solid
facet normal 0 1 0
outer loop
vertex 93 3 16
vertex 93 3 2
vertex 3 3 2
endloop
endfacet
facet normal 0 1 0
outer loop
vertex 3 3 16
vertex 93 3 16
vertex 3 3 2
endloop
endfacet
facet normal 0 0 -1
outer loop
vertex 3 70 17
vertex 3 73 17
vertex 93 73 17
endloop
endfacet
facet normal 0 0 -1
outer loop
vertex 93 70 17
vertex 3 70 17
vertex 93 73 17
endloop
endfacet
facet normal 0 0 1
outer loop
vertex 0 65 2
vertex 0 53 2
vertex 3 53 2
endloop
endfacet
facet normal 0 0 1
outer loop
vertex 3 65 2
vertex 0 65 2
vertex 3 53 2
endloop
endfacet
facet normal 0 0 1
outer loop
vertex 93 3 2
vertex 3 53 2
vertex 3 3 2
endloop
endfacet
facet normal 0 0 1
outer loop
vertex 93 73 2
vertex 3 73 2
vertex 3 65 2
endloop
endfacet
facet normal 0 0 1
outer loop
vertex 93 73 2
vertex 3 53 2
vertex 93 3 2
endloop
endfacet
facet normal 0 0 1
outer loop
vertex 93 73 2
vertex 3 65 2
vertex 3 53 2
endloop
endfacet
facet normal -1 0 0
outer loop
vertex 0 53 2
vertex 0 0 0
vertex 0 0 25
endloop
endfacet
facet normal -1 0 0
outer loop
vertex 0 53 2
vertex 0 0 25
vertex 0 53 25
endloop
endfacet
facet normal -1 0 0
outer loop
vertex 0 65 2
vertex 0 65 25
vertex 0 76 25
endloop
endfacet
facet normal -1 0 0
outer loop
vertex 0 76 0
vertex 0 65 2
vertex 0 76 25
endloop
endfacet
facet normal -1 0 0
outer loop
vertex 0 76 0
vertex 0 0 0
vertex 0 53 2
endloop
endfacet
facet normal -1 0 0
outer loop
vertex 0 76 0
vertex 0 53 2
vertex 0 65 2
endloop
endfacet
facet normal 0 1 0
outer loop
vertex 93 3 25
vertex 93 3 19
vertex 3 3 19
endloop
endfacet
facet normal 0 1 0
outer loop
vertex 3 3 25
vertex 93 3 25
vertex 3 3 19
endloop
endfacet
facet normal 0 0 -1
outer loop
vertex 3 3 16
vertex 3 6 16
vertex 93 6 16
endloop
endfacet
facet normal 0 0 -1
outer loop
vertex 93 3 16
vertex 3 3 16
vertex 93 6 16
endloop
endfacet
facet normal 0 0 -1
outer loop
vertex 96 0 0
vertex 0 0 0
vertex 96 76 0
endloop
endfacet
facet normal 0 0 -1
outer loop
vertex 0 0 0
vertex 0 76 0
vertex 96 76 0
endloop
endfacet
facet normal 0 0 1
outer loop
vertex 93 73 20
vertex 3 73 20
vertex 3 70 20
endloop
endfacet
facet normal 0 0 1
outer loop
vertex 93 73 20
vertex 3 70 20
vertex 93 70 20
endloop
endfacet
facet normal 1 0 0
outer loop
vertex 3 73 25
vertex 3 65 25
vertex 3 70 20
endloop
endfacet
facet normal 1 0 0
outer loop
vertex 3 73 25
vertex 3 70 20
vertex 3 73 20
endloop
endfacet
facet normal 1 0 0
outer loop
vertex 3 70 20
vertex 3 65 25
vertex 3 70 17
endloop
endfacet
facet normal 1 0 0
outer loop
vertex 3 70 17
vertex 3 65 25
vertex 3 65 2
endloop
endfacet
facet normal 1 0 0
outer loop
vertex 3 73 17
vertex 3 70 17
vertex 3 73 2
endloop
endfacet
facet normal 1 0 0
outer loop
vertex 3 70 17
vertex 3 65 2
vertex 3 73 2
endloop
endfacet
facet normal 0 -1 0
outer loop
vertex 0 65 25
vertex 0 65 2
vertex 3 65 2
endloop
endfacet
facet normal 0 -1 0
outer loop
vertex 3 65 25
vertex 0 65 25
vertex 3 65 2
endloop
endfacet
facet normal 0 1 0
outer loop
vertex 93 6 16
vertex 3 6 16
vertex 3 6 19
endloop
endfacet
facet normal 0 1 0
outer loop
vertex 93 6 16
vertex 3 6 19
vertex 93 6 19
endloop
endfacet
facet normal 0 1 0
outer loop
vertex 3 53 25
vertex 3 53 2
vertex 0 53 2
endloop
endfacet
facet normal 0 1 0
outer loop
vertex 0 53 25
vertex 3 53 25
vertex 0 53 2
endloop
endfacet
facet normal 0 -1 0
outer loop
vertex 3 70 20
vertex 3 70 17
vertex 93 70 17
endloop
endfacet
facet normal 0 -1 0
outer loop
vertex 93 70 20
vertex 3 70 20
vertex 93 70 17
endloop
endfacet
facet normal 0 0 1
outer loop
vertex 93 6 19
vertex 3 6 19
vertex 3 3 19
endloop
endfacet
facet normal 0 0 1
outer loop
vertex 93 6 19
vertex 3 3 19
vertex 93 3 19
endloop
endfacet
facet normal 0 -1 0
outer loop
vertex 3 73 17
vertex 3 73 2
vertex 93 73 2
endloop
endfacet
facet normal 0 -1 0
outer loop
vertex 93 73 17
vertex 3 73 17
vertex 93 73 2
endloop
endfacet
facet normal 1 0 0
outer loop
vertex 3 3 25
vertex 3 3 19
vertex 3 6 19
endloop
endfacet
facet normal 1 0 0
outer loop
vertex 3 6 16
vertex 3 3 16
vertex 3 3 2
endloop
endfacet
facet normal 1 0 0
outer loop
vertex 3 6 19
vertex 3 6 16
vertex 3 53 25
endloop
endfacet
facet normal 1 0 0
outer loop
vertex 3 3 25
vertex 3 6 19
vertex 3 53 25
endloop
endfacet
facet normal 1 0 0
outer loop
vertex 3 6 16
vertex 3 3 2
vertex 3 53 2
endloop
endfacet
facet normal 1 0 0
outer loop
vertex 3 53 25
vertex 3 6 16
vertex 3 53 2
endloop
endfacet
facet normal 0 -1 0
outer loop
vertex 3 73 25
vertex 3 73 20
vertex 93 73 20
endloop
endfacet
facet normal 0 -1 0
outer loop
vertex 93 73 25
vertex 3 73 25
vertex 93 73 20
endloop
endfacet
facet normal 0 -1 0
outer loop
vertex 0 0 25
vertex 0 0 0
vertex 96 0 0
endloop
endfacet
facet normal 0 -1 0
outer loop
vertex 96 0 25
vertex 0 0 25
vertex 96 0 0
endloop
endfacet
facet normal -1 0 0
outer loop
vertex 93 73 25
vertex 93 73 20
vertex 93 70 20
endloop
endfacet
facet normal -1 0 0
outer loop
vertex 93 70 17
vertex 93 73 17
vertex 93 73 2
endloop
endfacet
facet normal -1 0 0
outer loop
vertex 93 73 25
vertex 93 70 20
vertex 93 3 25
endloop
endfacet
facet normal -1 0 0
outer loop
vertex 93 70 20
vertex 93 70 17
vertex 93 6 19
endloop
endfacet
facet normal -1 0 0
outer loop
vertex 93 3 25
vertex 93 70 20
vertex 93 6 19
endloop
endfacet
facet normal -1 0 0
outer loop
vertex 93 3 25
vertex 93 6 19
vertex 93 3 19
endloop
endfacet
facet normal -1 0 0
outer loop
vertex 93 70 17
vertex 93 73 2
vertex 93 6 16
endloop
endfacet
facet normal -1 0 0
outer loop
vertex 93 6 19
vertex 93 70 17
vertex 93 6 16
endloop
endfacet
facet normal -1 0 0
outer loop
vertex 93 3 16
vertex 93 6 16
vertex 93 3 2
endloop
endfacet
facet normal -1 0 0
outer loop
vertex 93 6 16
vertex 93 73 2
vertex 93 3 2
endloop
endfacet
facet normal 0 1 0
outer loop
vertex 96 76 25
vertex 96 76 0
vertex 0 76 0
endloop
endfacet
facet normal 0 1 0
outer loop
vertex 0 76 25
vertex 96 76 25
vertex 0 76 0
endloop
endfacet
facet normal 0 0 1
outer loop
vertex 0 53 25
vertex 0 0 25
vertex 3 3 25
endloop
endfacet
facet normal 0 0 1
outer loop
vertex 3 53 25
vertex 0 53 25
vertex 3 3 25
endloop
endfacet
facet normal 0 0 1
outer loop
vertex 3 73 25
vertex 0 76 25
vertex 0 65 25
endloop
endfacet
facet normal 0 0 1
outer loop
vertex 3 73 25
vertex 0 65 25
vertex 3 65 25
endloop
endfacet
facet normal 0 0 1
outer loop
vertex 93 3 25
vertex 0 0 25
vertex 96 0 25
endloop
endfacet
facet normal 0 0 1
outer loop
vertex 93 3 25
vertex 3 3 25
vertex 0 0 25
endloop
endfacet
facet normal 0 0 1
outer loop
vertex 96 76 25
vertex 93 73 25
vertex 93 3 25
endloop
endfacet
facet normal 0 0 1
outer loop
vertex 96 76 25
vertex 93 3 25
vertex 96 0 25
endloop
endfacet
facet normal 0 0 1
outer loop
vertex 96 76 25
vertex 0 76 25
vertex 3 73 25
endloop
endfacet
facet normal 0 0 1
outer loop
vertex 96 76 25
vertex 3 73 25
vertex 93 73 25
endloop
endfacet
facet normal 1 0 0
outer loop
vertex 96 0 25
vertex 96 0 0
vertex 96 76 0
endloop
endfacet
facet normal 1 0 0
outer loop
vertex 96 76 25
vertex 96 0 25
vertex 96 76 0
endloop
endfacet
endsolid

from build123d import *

# Parameters (mm, degrees)
PAD_DEPTH    = 25
SKETCH001_W  = 96
SKETCH001_H  = 76
PAD001_DEPTH = 2
SKETCH002_W  = 96
SKETCH002_H  = 3
PAD002_DEPTH = 3
SKETCH003_W  = 96
SKETCH003_H  = 3
PAD003_DEPTH = 3


with BuildPart() as part:
    # Sketch → Pad (new body)
    with BuildSketch(Plane.XY):
        Polygon((0, 0), (96, 0), (96, 76), (0, 76), (0, 65), (3, 65), (3, 73), (93, 73), (93, 3), (3, 3), (3, 53), (0, 53), align=None)
    extrude(amount=PAD_DEPTH)

    # Sketch001 → Pad001 (join)
    with BuildSketch(Plane.XY):
        with Locations((48, 38)):
            Rectangle(SKETCH001_W, SKETCH001_H)
    extrude(amount=PAD001_DEPTH)

    # Sketch002 → Pad002 (join)
    with BuildSketch(Plane.XY.offset(16)):
        with Locations((48, 4.5)):
            Rectangle(SKETCH002_W, SKETCH002_H)
    extrude(amount=PAD002_DEPTH)

    # Sketch003 → Pad003 (join)
    with BuildSketch(Plane.XY.offset(17)):
        with Locations((48, 71.5)):
            Rectangle(SKETCH003_W, SKETCH003_H)
    extrude(amount=PAD003_DEPTH)


solid = part.part
